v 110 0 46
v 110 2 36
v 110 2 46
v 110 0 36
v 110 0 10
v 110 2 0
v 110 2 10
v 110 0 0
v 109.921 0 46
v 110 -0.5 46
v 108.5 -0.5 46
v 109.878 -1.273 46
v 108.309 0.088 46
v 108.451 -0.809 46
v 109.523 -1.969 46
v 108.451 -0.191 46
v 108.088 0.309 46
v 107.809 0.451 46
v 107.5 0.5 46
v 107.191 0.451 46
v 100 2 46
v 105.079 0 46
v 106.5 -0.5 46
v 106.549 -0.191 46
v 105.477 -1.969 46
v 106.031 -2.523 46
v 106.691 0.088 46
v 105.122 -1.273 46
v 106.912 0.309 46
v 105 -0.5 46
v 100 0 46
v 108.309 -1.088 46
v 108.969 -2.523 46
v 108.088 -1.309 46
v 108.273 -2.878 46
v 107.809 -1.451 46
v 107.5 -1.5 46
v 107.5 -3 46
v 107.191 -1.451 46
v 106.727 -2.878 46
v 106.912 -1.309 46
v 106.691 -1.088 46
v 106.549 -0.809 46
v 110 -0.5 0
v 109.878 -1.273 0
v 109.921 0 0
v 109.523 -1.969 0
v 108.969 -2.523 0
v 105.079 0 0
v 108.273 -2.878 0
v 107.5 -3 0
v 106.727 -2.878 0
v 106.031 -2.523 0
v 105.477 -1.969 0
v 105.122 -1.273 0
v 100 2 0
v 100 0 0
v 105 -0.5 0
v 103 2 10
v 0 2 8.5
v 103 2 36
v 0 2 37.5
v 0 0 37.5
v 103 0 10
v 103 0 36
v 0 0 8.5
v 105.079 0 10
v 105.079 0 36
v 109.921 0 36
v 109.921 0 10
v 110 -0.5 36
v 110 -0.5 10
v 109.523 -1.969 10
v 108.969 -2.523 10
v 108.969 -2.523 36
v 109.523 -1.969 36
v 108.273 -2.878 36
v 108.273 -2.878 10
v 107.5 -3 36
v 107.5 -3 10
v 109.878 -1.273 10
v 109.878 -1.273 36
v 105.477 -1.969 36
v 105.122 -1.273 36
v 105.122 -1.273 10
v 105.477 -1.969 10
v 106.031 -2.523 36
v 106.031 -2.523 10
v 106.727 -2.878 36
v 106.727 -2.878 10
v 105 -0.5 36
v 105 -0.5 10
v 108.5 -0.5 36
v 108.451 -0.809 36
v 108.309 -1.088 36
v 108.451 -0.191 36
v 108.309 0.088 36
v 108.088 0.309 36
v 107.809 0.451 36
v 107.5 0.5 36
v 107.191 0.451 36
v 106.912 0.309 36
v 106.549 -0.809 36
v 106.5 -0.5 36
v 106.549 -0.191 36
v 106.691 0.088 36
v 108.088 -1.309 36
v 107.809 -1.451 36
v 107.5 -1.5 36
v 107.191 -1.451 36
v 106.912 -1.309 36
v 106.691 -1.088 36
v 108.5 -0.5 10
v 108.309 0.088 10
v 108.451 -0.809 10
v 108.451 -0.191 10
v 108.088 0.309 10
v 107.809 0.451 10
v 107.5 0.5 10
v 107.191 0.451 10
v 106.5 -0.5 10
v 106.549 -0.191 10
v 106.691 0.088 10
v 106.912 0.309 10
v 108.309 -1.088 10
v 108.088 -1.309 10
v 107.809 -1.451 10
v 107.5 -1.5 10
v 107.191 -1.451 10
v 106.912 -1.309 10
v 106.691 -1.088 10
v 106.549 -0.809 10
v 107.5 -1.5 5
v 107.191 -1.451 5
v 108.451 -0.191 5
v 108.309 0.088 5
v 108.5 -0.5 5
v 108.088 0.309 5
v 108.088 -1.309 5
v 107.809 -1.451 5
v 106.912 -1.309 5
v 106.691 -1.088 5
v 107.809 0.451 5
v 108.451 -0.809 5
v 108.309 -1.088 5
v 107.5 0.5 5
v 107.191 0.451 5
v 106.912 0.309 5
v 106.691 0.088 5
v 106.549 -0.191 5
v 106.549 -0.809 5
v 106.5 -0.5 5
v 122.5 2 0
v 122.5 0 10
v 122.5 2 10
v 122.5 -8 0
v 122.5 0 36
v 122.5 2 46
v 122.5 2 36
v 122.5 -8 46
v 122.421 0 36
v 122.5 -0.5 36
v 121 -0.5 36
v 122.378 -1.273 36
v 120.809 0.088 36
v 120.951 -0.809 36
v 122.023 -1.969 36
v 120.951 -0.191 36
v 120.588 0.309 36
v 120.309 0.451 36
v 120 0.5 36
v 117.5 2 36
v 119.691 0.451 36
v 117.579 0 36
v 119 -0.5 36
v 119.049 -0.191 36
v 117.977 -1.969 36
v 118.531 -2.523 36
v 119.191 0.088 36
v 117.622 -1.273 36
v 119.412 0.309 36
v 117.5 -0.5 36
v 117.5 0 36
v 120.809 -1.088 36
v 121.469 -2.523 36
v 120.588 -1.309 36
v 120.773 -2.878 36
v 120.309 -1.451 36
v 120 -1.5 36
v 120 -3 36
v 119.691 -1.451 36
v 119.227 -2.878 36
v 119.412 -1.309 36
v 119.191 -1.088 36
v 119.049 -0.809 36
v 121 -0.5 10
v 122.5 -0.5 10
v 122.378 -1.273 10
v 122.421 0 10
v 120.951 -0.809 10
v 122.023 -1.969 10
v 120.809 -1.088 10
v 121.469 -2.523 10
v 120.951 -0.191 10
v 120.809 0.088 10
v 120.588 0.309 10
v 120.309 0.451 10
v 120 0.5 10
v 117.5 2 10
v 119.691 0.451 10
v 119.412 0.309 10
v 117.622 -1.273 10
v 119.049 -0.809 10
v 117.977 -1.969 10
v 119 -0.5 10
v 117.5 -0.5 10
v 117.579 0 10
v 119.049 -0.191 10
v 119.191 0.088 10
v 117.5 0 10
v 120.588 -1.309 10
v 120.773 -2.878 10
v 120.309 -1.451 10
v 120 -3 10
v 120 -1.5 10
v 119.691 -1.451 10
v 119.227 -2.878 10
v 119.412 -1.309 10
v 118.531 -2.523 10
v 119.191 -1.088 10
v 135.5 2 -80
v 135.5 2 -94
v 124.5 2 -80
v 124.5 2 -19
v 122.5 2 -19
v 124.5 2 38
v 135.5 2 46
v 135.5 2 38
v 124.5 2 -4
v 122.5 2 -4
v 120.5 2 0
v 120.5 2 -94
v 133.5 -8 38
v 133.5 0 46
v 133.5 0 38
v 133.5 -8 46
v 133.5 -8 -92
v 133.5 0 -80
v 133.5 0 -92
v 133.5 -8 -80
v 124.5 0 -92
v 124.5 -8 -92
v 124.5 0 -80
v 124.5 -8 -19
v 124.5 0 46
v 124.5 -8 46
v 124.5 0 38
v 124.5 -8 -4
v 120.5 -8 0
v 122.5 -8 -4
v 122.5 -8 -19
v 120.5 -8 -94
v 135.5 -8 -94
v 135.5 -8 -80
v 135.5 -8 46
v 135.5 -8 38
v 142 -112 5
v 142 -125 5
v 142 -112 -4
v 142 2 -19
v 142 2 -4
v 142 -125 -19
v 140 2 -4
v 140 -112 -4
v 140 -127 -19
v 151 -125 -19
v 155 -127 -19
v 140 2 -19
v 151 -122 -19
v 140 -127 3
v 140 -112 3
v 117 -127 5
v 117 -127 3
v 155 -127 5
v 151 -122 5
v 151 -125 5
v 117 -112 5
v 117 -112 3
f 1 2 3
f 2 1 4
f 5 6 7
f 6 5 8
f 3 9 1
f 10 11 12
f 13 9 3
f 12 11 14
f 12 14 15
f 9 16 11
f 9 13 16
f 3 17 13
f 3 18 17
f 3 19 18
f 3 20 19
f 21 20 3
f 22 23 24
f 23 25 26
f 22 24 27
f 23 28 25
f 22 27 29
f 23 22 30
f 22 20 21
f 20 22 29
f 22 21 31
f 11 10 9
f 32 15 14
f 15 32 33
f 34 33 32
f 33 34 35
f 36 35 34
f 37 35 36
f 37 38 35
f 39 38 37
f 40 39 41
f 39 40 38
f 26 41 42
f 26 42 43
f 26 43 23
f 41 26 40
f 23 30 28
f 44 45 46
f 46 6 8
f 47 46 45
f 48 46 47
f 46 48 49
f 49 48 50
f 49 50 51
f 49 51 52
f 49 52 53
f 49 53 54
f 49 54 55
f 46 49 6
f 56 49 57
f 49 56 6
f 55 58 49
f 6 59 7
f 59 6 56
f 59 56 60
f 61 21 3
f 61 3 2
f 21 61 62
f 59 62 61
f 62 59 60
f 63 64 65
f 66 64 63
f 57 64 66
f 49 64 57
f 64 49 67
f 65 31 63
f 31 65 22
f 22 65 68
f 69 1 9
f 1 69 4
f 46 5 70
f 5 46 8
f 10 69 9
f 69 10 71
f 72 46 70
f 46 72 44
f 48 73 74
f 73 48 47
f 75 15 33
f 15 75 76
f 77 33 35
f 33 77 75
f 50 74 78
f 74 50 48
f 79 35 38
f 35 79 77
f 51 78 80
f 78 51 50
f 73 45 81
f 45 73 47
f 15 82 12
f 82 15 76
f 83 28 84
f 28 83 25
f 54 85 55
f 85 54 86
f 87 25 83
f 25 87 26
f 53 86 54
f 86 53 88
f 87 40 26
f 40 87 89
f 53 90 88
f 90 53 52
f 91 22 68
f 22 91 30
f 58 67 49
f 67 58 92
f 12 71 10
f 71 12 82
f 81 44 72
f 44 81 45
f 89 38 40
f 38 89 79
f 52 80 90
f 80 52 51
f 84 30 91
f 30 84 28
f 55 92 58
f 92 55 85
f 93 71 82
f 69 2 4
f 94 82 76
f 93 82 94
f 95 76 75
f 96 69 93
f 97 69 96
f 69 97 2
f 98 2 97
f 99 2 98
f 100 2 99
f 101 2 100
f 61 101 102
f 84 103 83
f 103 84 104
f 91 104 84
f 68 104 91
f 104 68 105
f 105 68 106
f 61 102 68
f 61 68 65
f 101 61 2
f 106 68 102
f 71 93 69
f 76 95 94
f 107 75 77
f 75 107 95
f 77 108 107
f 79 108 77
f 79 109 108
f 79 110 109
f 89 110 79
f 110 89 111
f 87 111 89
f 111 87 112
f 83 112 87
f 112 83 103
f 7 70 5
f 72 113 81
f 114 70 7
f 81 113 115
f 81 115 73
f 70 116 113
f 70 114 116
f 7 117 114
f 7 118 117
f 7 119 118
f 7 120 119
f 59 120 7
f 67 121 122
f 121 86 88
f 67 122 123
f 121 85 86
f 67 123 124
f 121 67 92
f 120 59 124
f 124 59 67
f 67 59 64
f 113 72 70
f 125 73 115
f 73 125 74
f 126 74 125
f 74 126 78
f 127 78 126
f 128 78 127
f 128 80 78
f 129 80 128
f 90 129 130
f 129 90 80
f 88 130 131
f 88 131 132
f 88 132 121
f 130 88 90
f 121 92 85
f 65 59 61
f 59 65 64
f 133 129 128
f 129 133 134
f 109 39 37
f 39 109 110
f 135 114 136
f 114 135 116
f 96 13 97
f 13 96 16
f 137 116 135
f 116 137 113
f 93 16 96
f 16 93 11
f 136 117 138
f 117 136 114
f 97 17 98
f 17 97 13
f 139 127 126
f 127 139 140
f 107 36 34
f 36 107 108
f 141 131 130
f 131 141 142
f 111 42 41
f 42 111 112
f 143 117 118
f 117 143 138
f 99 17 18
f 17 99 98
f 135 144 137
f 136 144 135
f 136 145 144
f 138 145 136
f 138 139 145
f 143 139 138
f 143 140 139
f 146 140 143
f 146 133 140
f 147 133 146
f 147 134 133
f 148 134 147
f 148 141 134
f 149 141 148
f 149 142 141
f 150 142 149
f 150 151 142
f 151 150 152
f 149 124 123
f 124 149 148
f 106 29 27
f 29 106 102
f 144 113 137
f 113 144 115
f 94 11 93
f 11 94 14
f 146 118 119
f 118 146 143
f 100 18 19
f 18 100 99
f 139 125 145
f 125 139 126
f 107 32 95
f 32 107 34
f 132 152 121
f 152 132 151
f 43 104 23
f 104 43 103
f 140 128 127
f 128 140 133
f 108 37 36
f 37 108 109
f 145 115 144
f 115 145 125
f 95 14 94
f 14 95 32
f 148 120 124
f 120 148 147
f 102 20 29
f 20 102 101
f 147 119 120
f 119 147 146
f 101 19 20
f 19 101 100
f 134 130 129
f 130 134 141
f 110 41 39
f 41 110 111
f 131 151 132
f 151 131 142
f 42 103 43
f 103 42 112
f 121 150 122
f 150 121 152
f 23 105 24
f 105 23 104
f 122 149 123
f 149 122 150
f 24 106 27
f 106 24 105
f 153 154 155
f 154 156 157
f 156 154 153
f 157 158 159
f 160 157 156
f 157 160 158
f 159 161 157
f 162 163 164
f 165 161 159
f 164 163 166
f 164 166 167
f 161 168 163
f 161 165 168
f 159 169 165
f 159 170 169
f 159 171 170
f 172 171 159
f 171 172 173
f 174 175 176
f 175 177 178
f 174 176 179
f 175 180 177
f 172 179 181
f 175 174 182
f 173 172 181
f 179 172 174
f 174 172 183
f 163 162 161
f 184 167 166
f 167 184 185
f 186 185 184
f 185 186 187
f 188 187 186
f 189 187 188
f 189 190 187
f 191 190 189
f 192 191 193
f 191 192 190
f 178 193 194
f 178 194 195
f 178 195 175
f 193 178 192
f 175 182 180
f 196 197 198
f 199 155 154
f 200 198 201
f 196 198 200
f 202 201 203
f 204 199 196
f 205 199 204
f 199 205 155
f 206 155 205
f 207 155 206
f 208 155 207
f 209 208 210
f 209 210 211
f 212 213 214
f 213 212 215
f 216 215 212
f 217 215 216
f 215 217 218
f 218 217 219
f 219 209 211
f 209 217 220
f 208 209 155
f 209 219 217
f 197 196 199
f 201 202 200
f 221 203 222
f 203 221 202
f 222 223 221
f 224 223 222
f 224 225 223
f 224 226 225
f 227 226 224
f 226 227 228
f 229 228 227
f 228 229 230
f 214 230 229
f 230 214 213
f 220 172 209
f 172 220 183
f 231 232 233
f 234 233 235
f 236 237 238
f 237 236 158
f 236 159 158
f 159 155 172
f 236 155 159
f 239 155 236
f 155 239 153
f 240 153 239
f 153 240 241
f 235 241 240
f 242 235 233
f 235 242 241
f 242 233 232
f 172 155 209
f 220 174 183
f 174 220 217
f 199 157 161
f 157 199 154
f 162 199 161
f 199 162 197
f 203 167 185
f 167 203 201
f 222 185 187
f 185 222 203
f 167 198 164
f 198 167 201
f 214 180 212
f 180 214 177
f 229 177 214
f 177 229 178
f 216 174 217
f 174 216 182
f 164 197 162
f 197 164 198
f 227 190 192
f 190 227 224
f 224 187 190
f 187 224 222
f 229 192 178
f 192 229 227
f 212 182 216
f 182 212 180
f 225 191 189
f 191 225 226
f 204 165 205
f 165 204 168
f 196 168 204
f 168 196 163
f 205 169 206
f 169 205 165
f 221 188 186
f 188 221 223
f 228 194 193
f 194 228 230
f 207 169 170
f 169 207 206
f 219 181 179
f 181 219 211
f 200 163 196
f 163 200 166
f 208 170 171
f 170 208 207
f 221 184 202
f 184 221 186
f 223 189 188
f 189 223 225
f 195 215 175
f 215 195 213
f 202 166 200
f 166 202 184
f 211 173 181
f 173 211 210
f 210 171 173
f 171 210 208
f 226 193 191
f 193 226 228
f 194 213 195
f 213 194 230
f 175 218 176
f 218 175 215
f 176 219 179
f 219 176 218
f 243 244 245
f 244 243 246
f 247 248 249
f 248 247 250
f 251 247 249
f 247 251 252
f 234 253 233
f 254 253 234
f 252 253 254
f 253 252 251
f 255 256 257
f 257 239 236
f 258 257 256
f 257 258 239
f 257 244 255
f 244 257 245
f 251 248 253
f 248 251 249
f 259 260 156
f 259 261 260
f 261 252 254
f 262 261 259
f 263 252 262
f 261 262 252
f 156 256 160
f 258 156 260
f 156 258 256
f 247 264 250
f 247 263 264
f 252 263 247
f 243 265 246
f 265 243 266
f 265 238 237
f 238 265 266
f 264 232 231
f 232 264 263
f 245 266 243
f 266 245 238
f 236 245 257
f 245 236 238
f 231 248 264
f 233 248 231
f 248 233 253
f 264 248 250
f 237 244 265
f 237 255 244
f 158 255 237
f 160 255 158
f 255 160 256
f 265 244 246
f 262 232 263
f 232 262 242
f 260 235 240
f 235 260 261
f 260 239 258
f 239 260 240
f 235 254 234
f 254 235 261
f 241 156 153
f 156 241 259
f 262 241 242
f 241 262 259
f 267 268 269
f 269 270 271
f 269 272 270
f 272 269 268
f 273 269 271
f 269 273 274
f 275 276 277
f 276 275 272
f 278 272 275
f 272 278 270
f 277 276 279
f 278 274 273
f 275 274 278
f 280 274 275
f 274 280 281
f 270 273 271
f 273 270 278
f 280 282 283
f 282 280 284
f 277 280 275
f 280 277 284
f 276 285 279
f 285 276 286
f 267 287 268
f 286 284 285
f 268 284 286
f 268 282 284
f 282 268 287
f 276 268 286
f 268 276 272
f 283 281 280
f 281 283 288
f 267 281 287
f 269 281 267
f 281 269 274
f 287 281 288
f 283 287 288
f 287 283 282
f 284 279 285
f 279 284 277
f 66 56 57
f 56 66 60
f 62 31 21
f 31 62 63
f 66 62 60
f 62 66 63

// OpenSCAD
$fn=20;

//Profondeur
p = 100;

hMax = 46;
hMin = 29;
hDiff2 = (hMax - hMin) /2;

//Epaisseur
e = 2;

Interieur = [
  [ 0, 0, hDiff2        ], //0
  [ p, 0, 0             ], //1
  [ p, 0, hMax          ], //2
  [ 0, 0, hMax -  hDiff2], //3
  [ 0, e, hDiff2        ], //4
  [ p, e, 0             ], //5
  [ p, e, hMax          ], //6
  [ 0, e, hMax - hDiff2]]; //7
  
  
CubeFaces = [
  [4,5,1,0],  // bottom
  [7,6,5,4],  // front
  [3,2,6,7],  // top
  [6,2,1,5],  // right
  [2,3,0,1],  // back
  [3,7,4,0]]; // left

//Insert
polyhedron( Interieur, CubeFaces );

//Gond Fixe
difference(){

    translate([p,0,0]){
        cube([10,e,hMax]);
        
        translate([7.5,-0.5,0]){
            cylinder(hMax,d=5);
        }
    }


    translate([p+3,-3,10]){
        cube([10 ,5,hMax-2*10]);        
    }
    
    translate([p+7.5,-0.5,5]){
        cylinder(hMax,d=2);
    } 
}
//Gond mobile
difference(){
    translate([117.5,0,10]){
        cube([5 ,e,hMax-2*10]);
        translate([2.5,-0.5,0]){
                cylinder(hMax-2*10,d=5);
        }
    }
    translate([120,-0.5,10]){
        cylinder(hMax-2*10,d=2);
    }
}

//Pince appuie fond bas et droite
translate([122.5,-10+2,-140+hMax]){
    difference(){
        cube([2+2+9 ,10,140]);
        translate([2,0,2]){
            cube([9 ,10-2,140]);
            translate([0,0,12]){
                cube([9+2 ,10,140-22]);
            }
        }
        translate([0,0,75]){
            cube([2 ,10,15]);
        }
    }
    translate([-2,0,0]){
        cube([2 ,10,140-hMax]);
    }

}

    translate([140,-127,-19]){
        cube([2 ,129,15]);
        translate([2,0,0]){
            cube([9 ,2,24]);
        }
        translate([0,0,15]){
            cube([2 ,15,5+2]);
        }
        translate([-25+2,0,22]){
            cube([25 ,15,2]);
        }

        translate([11,5,0]){
            rotate([0,270,180]){
                triangle3d(24,5,4);
            }
        }
    }


    
module triangle3d(l,w,h){
    polyhedron(
        points=[[0,0,0], [l,0,0], [l,w,0], [0,w,0], [0,w,h], [l,w,h]],
        faces=[[0,1,2,3],[5,4,3,2],[0,4,5,1],[0,3,4],[5,2,1]]
    );
}
 
